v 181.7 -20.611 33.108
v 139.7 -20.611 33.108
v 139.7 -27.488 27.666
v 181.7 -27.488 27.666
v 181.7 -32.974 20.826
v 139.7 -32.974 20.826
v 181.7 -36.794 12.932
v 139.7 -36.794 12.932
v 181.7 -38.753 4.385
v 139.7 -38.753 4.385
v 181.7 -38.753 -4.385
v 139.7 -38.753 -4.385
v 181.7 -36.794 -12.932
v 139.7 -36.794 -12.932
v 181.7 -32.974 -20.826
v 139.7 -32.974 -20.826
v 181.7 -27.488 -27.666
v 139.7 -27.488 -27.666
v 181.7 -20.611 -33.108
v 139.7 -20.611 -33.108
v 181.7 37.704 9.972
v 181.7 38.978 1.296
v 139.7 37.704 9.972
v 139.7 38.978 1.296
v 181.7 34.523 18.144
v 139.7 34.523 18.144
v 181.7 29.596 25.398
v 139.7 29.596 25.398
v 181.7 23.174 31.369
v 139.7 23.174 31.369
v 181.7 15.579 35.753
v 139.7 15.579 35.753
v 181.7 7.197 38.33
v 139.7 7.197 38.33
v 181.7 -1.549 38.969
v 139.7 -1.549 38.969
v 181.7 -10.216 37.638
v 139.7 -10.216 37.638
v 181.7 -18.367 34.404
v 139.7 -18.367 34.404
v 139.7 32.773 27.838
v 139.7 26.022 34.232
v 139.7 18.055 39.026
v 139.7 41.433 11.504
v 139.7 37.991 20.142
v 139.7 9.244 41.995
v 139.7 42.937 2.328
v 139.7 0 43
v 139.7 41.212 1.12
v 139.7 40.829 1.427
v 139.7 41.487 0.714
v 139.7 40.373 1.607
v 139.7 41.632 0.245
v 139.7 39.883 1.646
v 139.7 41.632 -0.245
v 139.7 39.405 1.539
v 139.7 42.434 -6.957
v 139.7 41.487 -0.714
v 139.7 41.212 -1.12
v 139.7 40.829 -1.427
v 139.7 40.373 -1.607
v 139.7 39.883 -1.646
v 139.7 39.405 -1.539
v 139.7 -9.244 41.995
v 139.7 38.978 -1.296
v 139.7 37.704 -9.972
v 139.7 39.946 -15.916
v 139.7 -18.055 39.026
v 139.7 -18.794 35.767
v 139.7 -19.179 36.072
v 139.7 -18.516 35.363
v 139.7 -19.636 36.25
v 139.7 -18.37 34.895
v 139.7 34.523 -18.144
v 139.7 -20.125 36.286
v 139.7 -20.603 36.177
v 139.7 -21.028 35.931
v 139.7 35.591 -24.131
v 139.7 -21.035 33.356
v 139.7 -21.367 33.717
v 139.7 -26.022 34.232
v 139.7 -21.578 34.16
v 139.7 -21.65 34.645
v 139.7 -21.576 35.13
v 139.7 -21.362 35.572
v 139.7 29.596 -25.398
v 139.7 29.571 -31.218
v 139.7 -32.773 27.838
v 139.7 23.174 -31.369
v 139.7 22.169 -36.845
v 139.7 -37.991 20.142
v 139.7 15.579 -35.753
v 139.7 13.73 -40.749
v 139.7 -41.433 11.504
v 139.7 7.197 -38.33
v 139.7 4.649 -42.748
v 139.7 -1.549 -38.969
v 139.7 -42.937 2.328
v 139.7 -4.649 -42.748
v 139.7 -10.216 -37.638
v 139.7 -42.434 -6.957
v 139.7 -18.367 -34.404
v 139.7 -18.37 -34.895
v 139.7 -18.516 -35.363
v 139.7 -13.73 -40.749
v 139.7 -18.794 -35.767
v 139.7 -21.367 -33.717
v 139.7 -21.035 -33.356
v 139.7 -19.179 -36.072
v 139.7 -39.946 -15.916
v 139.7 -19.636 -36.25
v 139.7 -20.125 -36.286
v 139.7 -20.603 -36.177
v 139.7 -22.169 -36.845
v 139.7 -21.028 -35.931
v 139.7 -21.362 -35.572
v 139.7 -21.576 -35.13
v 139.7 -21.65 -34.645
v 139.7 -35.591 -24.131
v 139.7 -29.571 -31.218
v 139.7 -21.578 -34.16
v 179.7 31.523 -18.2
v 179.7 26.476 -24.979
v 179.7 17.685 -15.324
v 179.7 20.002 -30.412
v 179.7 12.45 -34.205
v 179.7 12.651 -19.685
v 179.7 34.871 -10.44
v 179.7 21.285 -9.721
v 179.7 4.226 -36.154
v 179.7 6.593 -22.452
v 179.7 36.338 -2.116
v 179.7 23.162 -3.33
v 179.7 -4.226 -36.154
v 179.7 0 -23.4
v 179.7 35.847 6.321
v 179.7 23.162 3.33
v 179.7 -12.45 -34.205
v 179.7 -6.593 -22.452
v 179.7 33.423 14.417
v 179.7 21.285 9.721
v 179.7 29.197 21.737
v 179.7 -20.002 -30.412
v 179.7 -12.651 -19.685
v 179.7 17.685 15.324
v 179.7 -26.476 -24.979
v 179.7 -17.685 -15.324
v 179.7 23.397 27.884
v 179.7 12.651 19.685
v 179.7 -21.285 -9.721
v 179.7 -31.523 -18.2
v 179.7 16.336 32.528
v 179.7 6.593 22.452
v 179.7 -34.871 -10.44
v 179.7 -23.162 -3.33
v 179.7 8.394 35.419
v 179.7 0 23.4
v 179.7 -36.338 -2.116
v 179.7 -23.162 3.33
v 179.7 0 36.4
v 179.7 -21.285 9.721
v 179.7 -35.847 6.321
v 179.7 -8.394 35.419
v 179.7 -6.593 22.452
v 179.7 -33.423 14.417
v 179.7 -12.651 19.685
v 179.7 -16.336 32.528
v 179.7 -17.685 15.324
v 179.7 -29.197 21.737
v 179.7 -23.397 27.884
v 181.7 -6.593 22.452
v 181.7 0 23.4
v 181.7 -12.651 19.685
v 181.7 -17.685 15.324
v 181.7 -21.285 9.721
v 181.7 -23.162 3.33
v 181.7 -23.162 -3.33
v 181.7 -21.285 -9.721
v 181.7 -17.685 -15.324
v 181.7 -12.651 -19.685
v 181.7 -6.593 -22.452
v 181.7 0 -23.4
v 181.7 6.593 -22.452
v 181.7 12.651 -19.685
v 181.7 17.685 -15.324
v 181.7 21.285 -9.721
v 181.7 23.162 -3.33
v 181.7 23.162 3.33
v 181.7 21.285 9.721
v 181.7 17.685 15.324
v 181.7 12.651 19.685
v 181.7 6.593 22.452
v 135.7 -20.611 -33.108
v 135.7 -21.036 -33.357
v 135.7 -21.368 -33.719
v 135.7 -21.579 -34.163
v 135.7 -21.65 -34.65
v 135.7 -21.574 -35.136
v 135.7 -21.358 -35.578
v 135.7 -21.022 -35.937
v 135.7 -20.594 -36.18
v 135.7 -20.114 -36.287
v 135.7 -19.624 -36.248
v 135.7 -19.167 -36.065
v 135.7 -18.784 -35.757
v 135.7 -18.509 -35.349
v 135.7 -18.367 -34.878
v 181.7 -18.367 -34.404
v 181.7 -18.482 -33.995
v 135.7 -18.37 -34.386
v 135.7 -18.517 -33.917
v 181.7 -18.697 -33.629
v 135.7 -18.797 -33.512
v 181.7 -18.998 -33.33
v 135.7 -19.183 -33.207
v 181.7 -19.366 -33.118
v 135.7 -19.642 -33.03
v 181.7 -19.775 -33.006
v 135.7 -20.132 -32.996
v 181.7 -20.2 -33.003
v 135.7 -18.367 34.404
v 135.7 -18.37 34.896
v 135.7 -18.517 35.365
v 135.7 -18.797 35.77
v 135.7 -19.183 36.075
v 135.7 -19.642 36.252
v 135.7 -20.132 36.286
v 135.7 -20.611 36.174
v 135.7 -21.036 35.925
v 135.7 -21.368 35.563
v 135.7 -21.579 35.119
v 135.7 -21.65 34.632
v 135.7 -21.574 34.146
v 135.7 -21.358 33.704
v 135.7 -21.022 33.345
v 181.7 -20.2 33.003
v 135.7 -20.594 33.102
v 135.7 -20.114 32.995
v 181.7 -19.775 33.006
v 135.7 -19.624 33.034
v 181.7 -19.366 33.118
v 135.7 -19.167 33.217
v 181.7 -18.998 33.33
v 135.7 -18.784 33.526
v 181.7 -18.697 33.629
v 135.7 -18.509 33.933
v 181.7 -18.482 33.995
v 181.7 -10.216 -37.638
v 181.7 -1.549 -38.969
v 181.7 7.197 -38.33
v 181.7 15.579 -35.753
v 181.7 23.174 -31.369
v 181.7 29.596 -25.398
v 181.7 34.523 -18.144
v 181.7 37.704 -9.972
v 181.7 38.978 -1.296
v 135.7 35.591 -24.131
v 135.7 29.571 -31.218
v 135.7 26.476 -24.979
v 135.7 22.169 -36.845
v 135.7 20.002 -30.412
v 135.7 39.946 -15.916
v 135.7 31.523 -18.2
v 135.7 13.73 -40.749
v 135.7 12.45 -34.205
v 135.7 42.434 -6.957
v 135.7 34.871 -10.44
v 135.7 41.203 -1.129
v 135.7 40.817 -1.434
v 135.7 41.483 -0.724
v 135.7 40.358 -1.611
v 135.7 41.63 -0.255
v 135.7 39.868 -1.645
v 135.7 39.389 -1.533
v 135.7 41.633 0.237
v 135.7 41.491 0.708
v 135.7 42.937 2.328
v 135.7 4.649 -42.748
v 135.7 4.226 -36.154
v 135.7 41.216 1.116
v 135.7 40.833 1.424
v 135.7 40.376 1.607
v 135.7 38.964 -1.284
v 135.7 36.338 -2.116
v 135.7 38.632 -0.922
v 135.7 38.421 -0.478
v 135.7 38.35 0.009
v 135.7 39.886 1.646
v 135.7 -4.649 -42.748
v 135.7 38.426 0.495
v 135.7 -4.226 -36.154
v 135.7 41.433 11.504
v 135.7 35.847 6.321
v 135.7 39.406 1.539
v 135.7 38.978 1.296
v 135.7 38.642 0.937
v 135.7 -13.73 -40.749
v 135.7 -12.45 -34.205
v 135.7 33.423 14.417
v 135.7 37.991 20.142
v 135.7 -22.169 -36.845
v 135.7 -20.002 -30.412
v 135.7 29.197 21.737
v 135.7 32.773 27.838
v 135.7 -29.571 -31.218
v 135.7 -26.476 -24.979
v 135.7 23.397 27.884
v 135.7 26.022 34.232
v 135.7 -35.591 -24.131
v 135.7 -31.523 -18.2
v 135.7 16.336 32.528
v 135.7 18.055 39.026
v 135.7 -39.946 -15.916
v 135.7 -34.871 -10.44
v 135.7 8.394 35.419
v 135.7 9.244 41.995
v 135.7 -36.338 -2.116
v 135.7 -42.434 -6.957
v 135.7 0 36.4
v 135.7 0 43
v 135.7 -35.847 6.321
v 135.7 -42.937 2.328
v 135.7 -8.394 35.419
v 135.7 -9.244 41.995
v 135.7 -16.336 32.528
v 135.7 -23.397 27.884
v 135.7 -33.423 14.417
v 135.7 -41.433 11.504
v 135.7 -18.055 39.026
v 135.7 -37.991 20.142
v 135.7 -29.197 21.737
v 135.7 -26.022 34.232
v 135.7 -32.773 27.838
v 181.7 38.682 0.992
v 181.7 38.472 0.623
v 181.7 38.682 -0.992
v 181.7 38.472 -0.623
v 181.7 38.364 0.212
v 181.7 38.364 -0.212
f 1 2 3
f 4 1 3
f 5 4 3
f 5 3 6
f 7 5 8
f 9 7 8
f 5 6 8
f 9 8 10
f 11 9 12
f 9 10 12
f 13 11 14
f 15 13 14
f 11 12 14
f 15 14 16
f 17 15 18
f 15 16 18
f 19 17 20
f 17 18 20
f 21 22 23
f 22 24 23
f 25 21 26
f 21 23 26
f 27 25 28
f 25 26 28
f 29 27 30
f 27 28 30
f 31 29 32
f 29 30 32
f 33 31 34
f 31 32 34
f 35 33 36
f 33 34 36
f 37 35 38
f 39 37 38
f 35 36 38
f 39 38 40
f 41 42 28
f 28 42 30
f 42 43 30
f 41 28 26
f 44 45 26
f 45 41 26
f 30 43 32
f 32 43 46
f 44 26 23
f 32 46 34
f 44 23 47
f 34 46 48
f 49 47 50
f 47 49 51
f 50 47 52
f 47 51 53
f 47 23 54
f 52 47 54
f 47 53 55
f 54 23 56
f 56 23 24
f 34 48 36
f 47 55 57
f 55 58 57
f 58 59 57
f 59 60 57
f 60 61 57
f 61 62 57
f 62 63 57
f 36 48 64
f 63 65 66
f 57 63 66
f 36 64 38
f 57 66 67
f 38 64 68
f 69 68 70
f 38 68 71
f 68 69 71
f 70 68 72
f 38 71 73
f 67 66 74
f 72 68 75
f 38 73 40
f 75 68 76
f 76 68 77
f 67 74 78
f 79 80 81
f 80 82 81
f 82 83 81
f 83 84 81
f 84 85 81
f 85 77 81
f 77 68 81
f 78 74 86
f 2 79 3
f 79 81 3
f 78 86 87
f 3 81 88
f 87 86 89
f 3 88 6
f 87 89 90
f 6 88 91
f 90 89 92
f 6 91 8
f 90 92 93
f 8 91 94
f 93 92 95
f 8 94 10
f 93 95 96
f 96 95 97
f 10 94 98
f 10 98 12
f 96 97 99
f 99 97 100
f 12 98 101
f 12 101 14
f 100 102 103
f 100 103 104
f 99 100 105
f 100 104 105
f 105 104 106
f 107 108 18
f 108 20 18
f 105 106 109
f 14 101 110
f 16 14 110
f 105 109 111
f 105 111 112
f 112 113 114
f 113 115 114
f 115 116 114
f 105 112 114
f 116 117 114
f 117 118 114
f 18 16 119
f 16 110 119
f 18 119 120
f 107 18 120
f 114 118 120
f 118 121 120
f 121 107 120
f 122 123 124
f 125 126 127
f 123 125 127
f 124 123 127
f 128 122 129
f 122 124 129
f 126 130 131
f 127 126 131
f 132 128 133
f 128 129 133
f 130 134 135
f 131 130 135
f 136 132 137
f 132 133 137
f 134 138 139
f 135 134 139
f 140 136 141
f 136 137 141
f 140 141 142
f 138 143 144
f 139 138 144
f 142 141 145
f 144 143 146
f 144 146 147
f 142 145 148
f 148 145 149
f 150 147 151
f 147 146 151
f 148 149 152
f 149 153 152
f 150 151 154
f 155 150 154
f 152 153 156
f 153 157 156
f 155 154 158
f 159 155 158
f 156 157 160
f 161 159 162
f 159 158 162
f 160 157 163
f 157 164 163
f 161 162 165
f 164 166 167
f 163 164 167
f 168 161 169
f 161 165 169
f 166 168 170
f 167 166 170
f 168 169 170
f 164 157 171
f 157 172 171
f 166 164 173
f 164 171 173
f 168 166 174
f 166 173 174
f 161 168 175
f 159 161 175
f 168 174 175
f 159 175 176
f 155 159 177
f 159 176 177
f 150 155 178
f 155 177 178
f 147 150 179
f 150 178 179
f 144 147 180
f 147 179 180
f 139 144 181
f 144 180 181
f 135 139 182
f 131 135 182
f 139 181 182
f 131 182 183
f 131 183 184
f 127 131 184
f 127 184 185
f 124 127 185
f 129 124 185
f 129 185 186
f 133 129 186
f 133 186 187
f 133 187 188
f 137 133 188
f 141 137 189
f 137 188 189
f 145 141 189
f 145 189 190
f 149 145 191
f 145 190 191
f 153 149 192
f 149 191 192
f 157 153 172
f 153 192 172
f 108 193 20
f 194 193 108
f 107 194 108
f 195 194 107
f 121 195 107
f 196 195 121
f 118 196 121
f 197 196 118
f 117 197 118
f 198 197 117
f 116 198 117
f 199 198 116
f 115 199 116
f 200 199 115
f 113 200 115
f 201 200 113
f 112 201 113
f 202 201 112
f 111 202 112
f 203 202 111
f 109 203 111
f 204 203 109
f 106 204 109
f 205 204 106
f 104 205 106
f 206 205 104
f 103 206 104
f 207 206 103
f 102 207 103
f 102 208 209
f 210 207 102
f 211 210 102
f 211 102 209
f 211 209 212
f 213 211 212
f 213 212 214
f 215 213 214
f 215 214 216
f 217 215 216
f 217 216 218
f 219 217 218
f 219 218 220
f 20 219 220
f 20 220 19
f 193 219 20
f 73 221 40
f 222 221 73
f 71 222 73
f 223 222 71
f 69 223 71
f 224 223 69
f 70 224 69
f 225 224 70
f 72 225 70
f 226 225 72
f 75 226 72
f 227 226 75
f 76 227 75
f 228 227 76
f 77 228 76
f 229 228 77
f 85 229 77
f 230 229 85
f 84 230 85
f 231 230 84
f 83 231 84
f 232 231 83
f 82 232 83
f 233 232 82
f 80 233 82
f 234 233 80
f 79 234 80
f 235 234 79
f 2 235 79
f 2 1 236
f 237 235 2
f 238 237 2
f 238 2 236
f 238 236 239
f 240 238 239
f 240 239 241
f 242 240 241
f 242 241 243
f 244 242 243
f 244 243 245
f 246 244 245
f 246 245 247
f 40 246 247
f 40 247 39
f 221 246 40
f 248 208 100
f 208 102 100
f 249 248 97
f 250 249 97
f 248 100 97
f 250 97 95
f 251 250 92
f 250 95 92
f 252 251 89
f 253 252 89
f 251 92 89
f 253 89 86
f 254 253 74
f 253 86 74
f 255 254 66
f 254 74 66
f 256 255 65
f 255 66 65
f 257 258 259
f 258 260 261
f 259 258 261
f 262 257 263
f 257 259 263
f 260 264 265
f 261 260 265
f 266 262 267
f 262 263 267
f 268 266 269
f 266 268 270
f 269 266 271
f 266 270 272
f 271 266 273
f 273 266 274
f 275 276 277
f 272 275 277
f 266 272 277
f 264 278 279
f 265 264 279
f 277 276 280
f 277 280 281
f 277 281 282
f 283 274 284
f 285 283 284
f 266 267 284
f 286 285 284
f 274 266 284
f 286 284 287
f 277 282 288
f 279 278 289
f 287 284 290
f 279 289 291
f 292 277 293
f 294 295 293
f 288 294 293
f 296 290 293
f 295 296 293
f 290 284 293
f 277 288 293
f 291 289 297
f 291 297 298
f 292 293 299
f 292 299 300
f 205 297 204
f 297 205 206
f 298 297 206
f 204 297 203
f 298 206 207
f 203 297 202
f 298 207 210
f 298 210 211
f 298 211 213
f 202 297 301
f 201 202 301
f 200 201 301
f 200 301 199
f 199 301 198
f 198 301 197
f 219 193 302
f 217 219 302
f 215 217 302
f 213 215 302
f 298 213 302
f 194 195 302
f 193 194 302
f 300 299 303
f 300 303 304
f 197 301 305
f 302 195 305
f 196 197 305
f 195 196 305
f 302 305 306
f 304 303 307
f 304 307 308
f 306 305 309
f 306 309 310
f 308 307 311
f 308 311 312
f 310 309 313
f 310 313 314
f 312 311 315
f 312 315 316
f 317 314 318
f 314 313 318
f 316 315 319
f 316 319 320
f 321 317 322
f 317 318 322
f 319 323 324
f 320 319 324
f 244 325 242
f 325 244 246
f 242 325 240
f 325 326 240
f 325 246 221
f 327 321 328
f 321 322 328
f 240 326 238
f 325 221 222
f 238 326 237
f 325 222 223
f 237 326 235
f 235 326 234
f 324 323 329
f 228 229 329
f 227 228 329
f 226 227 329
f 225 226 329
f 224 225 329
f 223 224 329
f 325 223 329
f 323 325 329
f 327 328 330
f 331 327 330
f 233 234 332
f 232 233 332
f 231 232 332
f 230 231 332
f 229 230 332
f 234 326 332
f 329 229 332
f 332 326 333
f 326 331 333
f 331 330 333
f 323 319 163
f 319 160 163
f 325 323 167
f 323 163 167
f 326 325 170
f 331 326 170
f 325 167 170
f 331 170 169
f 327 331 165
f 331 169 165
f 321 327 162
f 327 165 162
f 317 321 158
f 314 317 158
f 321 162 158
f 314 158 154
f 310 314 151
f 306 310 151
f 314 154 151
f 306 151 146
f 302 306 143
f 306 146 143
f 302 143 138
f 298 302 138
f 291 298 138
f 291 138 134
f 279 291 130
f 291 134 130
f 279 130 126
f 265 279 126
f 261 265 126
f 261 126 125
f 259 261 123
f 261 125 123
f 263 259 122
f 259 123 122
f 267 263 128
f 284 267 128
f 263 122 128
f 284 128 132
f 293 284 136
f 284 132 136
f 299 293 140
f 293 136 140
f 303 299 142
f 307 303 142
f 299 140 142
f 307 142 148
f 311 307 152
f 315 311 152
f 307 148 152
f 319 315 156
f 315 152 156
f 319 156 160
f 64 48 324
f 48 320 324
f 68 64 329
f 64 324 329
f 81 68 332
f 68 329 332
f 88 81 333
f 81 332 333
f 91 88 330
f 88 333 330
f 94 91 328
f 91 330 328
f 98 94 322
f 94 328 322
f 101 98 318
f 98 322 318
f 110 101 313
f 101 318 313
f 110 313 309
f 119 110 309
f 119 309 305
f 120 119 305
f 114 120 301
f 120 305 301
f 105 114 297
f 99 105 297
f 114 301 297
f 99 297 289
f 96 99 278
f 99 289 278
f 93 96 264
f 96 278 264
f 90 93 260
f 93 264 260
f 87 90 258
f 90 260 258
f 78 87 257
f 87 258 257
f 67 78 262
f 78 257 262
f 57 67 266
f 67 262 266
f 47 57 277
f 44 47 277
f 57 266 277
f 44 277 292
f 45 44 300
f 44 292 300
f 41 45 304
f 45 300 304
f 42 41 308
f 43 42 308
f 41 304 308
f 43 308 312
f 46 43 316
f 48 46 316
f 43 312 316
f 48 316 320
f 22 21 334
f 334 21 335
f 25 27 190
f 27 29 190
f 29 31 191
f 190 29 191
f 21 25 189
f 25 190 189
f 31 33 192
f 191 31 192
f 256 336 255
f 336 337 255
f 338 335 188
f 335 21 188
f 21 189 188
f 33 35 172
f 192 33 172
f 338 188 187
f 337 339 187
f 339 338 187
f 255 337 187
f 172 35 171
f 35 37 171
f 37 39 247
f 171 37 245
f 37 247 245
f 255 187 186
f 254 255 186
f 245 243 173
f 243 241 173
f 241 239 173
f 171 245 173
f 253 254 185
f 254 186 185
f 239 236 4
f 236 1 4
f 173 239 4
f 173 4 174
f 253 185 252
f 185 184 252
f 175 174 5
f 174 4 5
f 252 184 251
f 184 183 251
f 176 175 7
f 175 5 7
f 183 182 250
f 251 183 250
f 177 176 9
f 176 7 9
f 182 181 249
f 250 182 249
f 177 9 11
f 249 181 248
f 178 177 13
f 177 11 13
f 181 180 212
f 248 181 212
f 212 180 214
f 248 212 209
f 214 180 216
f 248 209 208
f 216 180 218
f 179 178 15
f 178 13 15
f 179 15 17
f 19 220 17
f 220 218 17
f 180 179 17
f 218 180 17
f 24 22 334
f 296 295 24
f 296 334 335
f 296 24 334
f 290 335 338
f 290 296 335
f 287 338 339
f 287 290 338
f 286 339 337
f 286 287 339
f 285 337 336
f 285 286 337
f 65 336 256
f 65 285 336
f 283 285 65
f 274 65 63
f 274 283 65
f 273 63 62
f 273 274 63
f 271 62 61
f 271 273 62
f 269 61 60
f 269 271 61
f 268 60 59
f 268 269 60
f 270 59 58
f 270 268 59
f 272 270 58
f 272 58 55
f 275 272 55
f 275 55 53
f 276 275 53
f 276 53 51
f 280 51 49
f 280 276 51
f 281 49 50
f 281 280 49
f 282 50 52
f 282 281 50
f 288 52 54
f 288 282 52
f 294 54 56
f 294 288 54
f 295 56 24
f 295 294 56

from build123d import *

# Parameters (mm, degrees)
AXIAL_HOLES_DEPTH      = 192.606080279
AXIAL_HOLES_DEPTH_BACK = 192.606080279
SKETCH2_R              = 1.65


with BuildPart() as part:
    # Axial profile (mm) → Full revolution (revolve)
    with BuildSketch(Plane.XY, mode=Mode.PRIVATE) as full_revolution_sk:
        Polygon((135.7, 36.4), (179.7, 36.4), (179.7, 23.4), (181.7, 23.4), (181.7, 39), (139.7, 39), (139.7, 43), (135.7, 43), align=None)
    revolve(full_revolution_sk.sketch.rotate(Axis((-110, 0, 0), (1, 0, 0)), 90), axis=Axis((-110, 0, 0), (1, 0, 0)))

    # Sketch2 → Axial holes (cut, two sides: drawn at the far end of the back side and taken through both)
    with BuildSketch(Plane(origin=(0, 0, 0), x_dir=(0, 0, -1), z_dir=(1, 0, 0)).offset(-AXIAL_HOLES_DEPTH_BACK)):
        with Locations(Location((0, 40, 0), (0, 0, 218.251159994))):
            Circle(SKETCH2_R)
        with Locations(Location((-34.641016151, -20, 0), (0, 0, 81.748840006))):
            Circle(SKETCH2_R)
        with Locations(Location((34.641016151, -20, 0), (0, 0, 201.748840006))):
            Circle(SKETCH2_R)
    extrude(amount=AXIAL_HOLES_DEPTH + AXIAL_HOLES_DEPTH_BACK, mode=Mode.SUBTRACT)


solid = part.part
